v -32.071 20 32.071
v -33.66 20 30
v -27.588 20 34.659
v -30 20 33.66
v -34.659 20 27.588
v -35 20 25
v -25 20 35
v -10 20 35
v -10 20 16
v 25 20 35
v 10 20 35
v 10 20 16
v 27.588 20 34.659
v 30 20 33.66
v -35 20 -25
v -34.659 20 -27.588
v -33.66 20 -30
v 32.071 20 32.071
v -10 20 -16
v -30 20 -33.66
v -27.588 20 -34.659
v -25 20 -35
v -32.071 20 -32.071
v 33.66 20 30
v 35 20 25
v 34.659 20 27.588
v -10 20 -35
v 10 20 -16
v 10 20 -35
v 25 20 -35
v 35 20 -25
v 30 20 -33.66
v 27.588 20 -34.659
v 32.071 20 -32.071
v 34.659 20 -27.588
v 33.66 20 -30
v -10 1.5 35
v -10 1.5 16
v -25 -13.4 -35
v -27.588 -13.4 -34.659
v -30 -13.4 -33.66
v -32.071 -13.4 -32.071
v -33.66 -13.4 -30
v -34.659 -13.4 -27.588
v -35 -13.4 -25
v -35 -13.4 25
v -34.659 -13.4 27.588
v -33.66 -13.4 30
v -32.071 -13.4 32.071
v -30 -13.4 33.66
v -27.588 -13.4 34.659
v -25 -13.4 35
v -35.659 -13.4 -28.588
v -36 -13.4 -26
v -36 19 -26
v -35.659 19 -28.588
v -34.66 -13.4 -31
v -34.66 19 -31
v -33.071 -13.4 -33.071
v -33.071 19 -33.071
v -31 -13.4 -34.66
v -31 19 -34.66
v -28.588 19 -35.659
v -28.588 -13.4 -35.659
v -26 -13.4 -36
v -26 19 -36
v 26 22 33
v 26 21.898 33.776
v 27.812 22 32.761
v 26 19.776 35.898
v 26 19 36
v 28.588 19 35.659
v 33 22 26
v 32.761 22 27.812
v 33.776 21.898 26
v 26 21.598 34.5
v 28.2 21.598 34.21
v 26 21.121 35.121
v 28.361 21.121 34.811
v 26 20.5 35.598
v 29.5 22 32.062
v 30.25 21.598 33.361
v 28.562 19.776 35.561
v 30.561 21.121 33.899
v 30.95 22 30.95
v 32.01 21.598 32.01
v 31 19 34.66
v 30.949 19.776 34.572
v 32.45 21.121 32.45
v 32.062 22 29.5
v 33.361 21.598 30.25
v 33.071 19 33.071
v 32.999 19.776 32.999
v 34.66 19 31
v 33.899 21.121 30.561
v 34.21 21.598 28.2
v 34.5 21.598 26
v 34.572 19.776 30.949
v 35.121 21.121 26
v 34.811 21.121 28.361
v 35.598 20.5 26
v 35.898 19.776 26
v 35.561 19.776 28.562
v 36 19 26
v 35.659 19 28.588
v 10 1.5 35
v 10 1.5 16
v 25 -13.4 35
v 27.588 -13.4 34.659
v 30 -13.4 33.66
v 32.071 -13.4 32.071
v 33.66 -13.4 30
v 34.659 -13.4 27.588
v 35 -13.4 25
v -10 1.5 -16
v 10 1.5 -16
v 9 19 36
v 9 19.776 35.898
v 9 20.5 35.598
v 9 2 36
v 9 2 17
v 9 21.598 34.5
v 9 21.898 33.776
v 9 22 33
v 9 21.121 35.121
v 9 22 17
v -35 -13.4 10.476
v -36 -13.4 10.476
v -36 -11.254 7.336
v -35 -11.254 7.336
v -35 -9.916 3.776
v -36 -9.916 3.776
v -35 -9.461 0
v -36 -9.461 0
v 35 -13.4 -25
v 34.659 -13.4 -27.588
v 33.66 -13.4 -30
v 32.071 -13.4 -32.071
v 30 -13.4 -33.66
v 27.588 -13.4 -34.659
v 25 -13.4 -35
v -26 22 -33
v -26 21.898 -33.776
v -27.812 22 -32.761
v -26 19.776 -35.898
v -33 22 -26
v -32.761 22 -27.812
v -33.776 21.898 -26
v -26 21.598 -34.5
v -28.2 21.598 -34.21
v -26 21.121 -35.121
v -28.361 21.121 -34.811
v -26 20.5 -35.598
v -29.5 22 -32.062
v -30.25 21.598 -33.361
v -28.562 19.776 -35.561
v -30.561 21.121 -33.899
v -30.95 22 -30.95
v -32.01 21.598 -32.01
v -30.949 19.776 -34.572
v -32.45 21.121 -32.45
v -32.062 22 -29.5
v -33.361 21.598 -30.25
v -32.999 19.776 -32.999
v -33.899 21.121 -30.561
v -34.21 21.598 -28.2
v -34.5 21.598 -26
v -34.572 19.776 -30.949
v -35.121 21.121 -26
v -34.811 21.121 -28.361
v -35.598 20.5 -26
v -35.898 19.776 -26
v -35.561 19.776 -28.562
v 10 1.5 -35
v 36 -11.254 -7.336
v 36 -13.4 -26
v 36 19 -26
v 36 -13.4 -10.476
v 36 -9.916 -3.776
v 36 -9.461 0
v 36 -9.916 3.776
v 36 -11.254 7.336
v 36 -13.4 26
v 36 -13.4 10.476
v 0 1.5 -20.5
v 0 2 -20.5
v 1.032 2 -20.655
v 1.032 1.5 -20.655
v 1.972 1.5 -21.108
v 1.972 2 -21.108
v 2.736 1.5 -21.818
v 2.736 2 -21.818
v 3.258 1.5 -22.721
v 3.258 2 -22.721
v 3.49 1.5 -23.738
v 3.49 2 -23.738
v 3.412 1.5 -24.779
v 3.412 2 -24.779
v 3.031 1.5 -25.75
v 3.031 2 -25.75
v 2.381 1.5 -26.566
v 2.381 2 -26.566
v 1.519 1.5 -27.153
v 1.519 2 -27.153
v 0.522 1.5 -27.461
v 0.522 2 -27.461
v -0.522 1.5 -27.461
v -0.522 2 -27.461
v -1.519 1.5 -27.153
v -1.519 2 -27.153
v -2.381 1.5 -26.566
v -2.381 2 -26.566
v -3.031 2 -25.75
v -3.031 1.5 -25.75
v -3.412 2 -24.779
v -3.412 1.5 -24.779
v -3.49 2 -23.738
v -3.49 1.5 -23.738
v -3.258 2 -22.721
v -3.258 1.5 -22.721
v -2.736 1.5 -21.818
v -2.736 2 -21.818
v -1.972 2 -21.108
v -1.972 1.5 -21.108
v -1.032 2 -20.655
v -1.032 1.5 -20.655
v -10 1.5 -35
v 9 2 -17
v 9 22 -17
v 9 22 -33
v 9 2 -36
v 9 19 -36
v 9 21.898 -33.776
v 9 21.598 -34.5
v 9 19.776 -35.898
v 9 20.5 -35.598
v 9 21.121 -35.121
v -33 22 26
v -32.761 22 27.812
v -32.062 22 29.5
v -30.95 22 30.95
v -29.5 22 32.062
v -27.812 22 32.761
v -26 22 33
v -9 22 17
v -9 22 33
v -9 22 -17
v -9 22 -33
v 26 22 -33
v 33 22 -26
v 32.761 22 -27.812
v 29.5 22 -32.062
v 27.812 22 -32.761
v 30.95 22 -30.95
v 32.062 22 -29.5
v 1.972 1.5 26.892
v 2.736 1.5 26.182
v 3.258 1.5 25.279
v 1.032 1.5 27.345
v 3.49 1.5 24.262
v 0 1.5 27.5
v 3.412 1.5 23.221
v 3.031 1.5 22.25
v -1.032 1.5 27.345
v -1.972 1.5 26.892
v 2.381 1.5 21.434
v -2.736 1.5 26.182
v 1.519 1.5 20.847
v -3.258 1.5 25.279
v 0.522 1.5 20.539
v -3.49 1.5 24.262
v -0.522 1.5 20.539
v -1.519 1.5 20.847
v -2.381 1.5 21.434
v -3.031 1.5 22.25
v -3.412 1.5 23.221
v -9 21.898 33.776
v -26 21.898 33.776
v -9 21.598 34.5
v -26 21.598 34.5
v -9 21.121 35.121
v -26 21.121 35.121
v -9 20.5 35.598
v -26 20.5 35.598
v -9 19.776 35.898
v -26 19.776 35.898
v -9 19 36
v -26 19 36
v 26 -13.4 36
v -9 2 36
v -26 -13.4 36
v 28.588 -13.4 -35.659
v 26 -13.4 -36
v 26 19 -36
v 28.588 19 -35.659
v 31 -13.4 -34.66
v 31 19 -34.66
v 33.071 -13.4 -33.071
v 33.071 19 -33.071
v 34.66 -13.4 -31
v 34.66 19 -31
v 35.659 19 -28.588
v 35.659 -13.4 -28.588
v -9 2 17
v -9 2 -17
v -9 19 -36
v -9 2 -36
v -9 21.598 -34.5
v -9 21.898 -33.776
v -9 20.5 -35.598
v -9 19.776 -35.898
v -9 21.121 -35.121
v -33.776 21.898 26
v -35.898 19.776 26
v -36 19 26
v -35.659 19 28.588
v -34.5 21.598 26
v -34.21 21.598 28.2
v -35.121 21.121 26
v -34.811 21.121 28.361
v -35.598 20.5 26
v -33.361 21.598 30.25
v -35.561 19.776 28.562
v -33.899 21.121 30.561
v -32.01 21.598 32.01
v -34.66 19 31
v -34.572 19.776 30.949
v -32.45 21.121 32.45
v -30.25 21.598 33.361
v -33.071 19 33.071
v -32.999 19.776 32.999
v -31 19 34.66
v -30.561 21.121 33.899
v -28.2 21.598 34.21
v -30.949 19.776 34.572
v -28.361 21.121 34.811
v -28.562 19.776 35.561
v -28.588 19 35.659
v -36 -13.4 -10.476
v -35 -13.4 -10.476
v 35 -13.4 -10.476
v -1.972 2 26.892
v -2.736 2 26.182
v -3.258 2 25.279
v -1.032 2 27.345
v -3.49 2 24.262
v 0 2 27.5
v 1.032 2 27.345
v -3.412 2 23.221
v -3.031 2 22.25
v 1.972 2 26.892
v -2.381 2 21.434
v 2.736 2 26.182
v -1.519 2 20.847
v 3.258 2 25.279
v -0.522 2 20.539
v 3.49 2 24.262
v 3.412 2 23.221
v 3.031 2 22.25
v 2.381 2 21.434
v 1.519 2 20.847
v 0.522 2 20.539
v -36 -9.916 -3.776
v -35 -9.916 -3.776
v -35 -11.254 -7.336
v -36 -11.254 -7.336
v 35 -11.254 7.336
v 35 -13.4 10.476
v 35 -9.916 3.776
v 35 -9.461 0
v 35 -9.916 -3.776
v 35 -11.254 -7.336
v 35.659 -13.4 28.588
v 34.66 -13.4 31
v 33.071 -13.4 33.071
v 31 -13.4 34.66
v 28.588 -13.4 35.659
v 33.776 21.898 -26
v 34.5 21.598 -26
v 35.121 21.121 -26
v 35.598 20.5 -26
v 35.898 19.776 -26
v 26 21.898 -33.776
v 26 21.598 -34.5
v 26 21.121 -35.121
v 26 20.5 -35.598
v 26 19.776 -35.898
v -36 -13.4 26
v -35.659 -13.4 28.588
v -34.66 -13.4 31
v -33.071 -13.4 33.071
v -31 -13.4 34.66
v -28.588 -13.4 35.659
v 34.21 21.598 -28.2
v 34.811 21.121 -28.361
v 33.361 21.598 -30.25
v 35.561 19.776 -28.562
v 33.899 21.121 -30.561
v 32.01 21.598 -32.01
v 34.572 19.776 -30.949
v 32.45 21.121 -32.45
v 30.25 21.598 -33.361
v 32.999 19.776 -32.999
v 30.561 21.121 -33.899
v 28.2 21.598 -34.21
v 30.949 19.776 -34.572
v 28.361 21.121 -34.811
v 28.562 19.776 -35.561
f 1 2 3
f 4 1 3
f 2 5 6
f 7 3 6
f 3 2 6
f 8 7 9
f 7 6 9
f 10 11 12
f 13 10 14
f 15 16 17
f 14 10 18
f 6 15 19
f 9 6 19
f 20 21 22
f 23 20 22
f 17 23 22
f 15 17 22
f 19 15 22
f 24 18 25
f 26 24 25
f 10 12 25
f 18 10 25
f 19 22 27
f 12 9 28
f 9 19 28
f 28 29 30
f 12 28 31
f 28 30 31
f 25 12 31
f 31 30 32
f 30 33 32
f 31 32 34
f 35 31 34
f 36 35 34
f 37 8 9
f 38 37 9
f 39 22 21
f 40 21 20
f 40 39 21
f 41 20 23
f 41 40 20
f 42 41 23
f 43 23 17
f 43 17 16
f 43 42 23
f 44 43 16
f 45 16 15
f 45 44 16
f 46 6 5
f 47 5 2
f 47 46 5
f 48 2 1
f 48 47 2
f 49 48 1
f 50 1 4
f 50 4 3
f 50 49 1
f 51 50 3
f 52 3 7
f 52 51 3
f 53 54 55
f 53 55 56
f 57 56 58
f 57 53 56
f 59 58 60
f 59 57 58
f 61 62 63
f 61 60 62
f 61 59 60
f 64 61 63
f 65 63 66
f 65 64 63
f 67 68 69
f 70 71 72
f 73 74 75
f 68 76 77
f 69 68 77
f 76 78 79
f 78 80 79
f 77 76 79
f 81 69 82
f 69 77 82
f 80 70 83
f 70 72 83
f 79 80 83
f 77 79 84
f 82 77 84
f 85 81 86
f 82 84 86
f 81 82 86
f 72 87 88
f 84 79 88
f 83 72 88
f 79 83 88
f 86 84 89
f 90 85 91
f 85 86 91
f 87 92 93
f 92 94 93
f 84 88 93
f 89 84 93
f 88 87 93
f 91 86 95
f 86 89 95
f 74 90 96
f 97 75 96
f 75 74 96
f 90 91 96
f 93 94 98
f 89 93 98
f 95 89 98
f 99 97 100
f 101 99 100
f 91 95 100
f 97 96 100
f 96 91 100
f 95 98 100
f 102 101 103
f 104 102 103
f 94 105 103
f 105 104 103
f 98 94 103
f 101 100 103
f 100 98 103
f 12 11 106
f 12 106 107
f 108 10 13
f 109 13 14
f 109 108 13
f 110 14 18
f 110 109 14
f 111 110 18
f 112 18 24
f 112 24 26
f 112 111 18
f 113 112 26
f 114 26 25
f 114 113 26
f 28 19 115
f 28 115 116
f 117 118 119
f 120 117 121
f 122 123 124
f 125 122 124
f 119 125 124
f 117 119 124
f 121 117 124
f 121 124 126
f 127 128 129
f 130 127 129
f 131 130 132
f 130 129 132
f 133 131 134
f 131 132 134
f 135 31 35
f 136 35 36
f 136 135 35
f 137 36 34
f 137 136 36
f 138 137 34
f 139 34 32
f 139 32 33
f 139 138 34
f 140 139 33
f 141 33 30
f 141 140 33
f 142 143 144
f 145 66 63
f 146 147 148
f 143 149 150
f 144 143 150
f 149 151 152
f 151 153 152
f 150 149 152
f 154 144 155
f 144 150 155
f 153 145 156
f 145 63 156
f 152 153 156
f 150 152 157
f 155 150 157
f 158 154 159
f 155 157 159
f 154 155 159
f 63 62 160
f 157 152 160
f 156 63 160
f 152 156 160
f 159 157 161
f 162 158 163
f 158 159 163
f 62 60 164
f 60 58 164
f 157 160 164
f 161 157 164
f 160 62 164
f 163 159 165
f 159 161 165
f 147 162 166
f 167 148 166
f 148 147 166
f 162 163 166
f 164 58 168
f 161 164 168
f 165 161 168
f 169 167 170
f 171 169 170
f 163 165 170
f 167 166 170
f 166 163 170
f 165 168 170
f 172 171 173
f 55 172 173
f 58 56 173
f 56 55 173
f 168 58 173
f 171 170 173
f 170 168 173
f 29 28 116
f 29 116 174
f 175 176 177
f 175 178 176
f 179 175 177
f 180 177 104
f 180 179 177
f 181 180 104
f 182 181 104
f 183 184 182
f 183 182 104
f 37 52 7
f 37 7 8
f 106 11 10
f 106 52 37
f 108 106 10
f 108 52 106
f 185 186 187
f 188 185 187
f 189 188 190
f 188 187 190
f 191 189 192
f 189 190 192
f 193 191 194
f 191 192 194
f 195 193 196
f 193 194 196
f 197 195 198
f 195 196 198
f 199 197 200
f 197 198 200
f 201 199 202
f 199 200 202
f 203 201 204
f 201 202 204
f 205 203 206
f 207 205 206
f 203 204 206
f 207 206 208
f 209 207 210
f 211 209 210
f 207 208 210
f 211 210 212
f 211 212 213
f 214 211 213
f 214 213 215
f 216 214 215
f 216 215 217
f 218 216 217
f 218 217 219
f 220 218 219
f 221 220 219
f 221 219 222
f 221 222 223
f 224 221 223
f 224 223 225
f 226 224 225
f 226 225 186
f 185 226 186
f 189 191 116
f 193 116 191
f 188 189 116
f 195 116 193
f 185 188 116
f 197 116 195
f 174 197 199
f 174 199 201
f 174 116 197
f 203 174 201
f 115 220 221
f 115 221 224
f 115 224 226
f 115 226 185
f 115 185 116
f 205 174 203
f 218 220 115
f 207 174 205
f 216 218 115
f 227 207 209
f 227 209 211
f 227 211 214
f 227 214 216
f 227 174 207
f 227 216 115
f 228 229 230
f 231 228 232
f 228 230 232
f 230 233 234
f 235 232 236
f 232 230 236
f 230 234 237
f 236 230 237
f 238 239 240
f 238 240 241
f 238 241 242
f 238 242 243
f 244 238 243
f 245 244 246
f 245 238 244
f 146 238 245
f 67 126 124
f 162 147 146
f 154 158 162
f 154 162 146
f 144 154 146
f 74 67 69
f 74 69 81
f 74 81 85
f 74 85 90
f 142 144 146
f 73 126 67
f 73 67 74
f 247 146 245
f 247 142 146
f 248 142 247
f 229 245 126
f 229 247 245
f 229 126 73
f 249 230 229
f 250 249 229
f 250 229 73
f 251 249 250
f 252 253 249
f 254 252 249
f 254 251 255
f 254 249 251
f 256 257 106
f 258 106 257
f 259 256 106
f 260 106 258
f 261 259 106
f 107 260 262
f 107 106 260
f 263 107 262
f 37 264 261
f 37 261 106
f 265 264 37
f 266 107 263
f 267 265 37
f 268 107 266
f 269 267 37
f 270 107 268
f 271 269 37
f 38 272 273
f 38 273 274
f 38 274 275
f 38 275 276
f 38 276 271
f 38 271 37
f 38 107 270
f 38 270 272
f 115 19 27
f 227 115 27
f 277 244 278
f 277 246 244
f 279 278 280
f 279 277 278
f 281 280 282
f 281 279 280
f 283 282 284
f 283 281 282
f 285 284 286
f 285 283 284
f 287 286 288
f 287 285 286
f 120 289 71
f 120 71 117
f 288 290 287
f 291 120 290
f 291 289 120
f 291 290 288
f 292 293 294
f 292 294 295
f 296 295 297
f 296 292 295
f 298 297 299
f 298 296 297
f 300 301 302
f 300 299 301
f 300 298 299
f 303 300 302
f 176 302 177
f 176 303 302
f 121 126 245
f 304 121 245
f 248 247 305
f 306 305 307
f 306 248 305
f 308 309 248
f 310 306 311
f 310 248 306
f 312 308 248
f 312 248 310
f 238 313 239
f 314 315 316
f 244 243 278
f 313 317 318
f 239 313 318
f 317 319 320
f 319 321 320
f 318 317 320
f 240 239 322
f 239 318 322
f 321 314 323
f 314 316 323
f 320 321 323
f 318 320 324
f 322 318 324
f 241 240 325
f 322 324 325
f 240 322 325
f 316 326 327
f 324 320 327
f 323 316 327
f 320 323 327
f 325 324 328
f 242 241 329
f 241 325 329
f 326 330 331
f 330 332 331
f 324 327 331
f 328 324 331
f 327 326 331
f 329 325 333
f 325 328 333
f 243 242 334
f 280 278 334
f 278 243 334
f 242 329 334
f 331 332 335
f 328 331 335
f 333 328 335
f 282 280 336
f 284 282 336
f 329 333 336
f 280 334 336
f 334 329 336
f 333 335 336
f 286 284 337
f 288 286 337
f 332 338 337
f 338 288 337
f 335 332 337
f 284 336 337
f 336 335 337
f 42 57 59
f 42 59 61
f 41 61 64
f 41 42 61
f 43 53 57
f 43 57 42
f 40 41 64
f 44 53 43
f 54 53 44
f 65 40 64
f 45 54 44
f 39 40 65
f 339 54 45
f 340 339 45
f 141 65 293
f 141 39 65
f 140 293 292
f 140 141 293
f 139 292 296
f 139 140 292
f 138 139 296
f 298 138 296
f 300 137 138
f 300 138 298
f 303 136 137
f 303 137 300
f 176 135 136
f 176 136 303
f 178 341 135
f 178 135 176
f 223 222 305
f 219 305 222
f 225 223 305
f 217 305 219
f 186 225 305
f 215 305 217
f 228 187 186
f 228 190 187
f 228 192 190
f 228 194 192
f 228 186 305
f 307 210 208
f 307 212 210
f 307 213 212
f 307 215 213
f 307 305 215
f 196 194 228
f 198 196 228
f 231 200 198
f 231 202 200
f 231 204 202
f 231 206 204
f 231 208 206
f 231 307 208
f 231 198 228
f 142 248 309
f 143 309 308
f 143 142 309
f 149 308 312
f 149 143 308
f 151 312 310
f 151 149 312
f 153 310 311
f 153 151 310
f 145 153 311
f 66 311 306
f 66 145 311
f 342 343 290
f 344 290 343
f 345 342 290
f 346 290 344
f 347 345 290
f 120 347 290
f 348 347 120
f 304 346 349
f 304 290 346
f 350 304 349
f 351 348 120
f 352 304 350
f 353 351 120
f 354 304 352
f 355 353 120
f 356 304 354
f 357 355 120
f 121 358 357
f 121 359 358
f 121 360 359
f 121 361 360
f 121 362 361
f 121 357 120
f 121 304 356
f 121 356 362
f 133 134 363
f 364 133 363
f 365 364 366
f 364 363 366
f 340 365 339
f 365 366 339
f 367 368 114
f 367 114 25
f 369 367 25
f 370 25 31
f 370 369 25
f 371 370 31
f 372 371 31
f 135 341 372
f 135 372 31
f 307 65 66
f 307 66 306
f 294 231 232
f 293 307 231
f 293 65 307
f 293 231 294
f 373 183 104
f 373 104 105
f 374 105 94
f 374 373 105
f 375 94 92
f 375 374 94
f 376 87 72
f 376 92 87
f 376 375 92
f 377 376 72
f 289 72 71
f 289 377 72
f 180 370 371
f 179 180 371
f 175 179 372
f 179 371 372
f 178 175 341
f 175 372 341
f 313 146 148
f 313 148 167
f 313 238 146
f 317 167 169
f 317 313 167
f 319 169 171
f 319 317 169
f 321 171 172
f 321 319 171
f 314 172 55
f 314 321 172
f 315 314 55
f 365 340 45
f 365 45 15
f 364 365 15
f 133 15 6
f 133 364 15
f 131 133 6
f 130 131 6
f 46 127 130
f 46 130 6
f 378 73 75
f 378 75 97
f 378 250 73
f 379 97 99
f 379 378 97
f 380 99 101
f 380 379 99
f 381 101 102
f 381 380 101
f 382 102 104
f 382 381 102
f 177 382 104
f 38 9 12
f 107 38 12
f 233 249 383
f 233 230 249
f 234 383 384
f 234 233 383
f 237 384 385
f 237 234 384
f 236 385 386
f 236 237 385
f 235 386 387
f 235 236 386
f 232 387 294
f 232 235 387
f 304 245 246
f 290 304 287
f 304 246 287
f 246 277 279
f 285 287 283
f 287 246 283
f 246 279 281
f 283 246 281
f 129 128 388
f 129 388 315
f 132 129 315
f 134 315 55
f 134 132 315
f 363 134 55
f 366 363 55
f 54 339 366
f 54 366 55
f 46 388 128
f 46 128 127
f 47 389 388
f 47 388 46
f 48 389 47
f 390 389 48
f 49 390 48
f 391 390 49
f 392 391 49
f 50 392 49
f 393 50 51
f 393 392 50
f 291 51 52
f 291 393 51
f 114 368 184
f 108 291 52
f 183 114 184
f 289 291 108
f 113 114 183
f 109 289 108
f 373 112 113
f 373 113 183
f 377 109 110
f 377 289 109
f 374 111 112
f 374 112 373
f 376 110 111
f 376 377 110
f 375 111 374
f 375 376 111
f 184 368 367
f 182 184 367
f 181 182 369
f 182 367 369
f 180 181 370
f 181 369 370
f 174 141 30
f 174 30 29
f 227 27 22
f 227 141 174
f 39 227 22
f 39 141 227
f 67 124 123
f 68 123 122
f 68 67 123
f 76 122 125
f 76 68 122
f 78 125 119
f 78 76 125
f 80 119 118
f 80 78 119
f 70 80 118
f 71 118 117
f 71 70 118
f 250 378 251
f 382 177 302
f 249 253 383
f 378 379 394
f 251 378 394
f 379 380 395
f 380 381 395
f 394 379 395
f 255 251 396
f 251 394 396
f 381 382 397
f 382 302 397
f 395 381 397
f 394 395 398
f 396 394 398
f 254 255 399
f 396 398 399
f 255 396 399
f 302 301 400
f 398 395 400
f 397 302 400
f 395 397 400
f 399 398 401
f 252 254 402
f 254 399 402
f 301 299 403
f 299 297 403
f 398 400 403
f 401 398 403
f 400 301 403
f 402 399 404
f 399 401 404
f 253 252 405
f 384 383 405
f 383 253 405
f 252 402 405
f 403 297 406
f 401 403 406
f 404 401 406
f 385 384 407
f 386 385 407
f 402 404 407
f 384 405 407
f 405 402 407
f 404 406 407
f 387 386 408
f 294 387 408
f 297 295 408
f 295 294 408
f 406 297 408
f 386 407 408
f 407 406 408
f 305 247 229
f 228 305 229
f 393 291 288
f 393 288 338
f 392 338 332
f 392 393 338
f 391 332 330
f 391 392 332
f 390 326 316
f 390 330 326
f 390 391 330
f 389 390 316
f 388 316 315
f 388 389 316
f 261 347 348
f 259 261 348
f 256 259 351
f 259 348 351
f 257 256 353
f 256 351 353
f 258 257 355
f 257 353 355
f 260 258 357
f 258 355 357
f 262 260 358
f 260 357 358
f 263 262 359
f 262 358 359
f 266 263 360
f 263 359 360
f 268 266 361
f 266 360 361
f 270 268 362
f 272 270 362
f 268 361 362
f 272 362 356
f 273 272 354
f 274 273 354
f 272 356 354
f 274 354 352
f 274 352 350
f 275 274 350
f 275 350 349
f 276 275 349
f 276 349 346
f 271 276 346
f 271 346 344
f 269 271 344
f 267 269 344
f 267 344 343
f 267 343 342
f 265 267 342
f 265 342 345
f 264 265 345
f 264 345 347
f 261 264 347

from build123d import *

# Parameters (mm, degrees)
BOSS_EXTRUDE1_DEPTH = 20
BOSS_EXTRUDE2_DEPTH = 2
SKETCH5_W           = 20
SKETCH5_H           = 20
SKETCH5_R           = 3.5
BOSS_EXTRUDE3_DEPTH = 22
SKETCH6_W           = 18
SKETCH6_H           = 19
CUT_EXTRUDE1_DEPTH  = 20
SKETCH7_W           = 20
SKETCH7_H           = 19
CUT_EXTRUDE2_DEPTH  = 1.5
FILLET1_R           = 3
SKETCH8_R           = 15.7
CUT_EXTRUDE3_DEPTH  = 121.5
BOSS_EXTRUDE6_START = 13.4
BOSS_EXTRUDE6_DEPTH = 13.4
SKETCH12_W          = 1
SKETCH12_H          = 30.481485494
BOSS_EXTRUDE7_DEPTH = 23.4
CUT_EXTRUDE4_DEPTH  = 93.4


with BuildPart() as part:
    # Sketch3 → Boss-Extrude1 (new body)
    with BuildSketch(Plane(origin=(0, 0, 0), x_dir=(1, 0, 0), z_dir=(0, 1, 0))):
        with BuildLine():
            Line((36, -26), (36, 26))
            ThreePointArc((36, 26), (33.071067812, 33.071067812), (26, 36))
            Line((26, 36), (-26, 36))
            ThreePointArc((-26, 36), (-33.071067812, 33.071067812), (-36, 26))
            Line((-36, 26), (-36, -26))
            ThreePointArc((-36, -26), (-33.071067812, -33.071067812), (-26, -36))
            Line((-26, -36), (26, -36))
            ThreePointArc((26, -36), (33.071067812, -33.071067812), (36, -26))
        make_face()
        with BuildLine():
            Line((-35, 25), (-35, -25))
            ThreePointArc((-35, -25), (-32.071067812, -32.071067812), (-25, -35))
            Line((-25, -35), (25, -35))
            ThreePointArc((25, -35), (32.071067812, -32.071067812), (35, -25))
            Line((35, -25), (35, 25))
            ThreePointArc((35, 25), (32.071067812, 32.071067812), (25, 35))
            Line((25, 35), (-25, 35))
            ThreePointArc((-25, 35), (-32.071067812, 32.071067812), (-35, 25))
        make_face(mode=Mode.SUBTRACT)
    extrude(amount=BOSS_EXTRUDE1_DEPTH)

    # Sketch4 → Boss-Extrude2 (add)
    with BuildSketch(Plane(origin=(0, 20, 0), x_dir=(1, 0, 0), z_dir=(0, 1, 0))):
        with BuildLine():
            Line((0, 36), (0, 0))
            Line((0, 0), (-36, 0))
            Line((-36, 0), (-36, -26))
            ThreePointArc((-36, -26), (-33.071067812, -33.071067812), (-26, -36))
            Line((-26, -36), (26, -36))
            ThreePointArc((26, -36), (33.071067812, -33.071067812), (36, -26))
            Line((36, -26), (36, 26))
            ThreePointArc((36, 26), (33.071067812, 33.071067812), (26, 36))
            Line((26, 36), (0, 36))
        make_face()
        with BuildLine():
            Line((-36, 0), (0, 0))
            Line((0, 0), (0, 36))
            Line((0, 36), (-26, 36))
            ThreePointArc((-26, 36), (-33.071067812, 33.071067812), (-36, 26))
            Line((-36, 26), (-36, 0))
        make_face()
    extrude(amount=BOSS_EXTRUDE2_DEPTH)

    # Sketch5 → Boss-Extrude3 (add)
    # profile 1 of 2: a face of its own
    with BuildSketch(Plane(origin=(0, 22, 0), x_dir=(1, 0, 0), z_dir=(0, 1, 0))):
        with Locations((0, 26)):
            Rectangle(SKETCH5_W, SKETCH5_H)
        with Locations(Location((0, 24, 0), (0, 0, 270))):
            Circle(SKETCH5_R, mode=Mode.SUBTRACT)
    # profile 2 of 2: a face of its own
    with BuildSketch(Plane(origin=(0, 22, 0), x_dir=(1, 0, 0), z_dir=(0, 1, 0))):
        with Locations((0, -26)):
            Rectangle(SKETCH5_W, SKETCH5_H)
        with Locations(Location((0, -24, 0), (0, 0, 270))):
            Circle(SKETCH5_R, mode=Mode.SUBTRACT)
    extrude(amount=-BOSS_EXTRUDE3_DEPTH)

    # Sketch6 → Cut-Extrude1 (cut)
    with BuildSketch(Plane(origin=(0, 22, 0), x_dir=(1, 0, 0), z_dir=(0, 1, 0))):
        Polygon((0, -17), (-9, -17), (-9, -36), (9, -36), (9, -17), align=None)
        with Locations((0, 26.5)):
            Rectangle(SKETCH6_W, SKETCH6_H)
    extrude(amount=-CUT_EXTRUDE1_DEPTH, mode=Mode.SUBTRACT)

    # Sketch7 → Cut-Extrude2 (cut)
    with BuildSketch(Plane(origin=(0, 0, 0), x_dir=(-1, 0, 0), z_dir=(0, -1, 0))):
        with Locations((0, 25.5)):
            Rectangle(SKETCH7_W, SKETCH7_H)
        with Locations((0, -25.5)):
            Rectangle(SKETCH7_W, SKETCH7_H)
    extrude(amount=-CUT_EXTRUDE2_DEPTH, mode=Mode.SUBTRACT)

    # Fillet1
    fillet1_edges = [part.edges().sort_by_distance(p)[0] for p in [
        (-17.5, 22, 36),
        (-17.5, 22, -36),
        (-33.071067812, 22, 33.071067812),
        (17.5, 22, 36),
        (36, 22, 0),
        (33.071067812, 22, -33.071067812),
        (17.5, 22, -36),
        (-33.071067812, 22, -33.071067812),
        (-36, 22, 0),
        (33.071067812, 22, 33.071067812),
    ]]
    fillet(fillet1_edges, radius=FILLET1_R)

    # Sketch8 → Cut-Extrude3 (cut)
    with BuildSketch(Plane(origin=(36, 0, 0), x_dir=(0, 0, -1), z_dir=(1, 0, 0))):
        with Locations((0, -12.6)):
            Circle(SKETCH8_R)
    extrude(amount=-CUT_EXTRUDE3_DEPTH, mode=Mode.SUBTRACT)

    # Sketch9 → Boss-Extrude6 (add)
    with BuildSketch(Plane(origin=(0, 0, 0), x_dir=(-1, 0, 0), z_dir=(0, -1, 0)).offset(BOSS_EXTRUDE6_START)):
        with BuildLine():
            Line((26, 36), (-26, 36))
            ThreePointArc((-26, 36), (-33.071067812, 33.071067812), (-36, 26))
            Line((-36, 26), (-36, -26))
            ThreePointArc((-36, -26), (-33.071067812, -33.071067812), (-26, -36))
            Line((-26, -36), (26, -36))
            ThreePointArc((26, -36), (33.071067812, -33.071067812), (36, -26))
            Line((36, -26), (36, 26))
            ThreePointArc((36, 26), (33.071067812, 33.071067812), (26, 36))
        make_face()
        with BuildLine():
            ThreePointArc((25, 35), (32.071067812, 32.071067812), (35, 25))
            Line((35, 25), (35, -25))
            ThreePointArc((35, -25), (32.071067812, -32.071067812), (25, -35))
            Line((25, -35), (-25, -35))
            ThreePointArc((-25, -35), (-32.071067812, -32.071067812), (-35, -25))
            Line((-35, -25), (-35, 25))
            ThreePointArc((-35, 25), (-32.071067812, 32.071067812), (-25, 35))
            Line((-25, 35), (25, 35))
        make_face(mode=Mode.SUBTRACT)
    extrude(amount=-BOSS_EXTRUDE6_DEPTH)

    # Sketch12 → Boss-Extrude7 (add)
    with BuildSketch(Plane.XZ.offset(13.4)):
        with Locations((-35.5, 0.993188546)):
            Rectangle(SKETCH12_W, SKETCH12_H)
        with Locations((35.5, 0.993188546)):
            Rectangle(SKETCH12_W, SKETCH12_H)
    extrude(amount=-BOSS_EXTRUDE7_DEPTH)

    # Sketch13 → Cut-Extrude4 (cut)
    with BuildSketch(Plane.ZY.offset(36)):
        with BuildLine():
            Line((-10.476256632, -13.4), (0, -13.4))
            Line((0, -13.4), (0, -9.460687563))
            ThreePointArc((0, -9.460687563), (-5.596207097, -10.478064604), (-10.476256632, -13.4))
        make_face()
        with BuildLine():
            Line((0, -9.460687563), (0, -13.4))
            Line((0, -13.4), (10.476256632, -13.4))
            ThreePointArc((10.476256632, -13.4), (5.596207097, -10.478064604), (0, -9.460687563))
        make_face()
    extrude(amount=-CUT_EXTRUDE4_DEPTH, mode=Mode.SUBTRACT)


solid = part.part
